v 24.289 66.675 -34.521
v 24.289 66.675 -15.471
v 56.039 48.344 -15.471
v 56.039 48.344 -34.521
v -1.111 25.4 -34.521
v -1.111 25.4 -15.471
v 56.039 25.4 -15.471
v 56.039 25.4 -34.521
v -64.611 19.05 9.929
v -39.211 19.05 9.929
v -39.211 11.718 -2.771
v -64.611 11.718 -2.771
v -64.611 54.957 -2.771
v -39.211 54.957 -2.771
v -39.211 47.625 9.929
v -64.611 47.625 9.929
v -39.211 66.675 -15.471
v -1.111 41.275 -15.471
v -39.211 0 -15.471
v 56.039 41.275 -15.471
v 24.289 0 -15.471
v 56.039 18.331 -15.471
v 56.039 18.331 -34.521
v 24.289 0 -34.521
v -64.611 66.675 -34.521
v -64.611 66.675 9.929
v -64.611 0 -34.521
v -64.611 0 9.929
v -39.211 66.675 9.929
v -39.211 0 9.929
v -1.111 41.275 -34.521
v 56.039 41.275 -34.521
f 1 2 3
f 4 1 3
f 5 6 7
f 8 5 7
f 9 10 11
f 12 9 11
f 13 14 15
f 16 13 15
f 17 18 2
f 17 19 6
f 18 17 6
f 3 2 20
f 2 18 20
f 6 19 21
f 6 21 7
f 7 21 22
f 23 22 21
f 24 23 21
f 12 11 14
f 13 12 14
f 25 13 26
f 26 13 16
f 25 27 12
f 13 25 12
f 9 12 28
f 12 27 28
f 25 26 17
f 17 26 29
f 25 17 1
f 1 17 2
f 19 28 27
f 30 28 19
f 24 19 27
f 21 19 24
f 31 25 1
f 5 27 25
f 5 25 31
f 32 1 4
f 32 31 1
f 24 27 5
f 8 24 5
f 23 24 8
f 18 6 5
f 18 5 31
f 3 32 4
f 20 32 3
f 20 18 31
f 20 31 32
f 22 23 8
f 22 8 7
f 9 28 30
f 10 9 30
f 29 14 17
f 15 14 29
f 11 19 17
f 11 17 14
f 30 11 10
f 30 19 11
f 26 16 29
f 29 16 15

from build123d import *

# Parameters (mm, degrees)
F0_W     = 120.65
F0_H     = 44.45
F1_DEPTH = 66.675
F2_W     = 95.25
F2_H     = 25.4
F3_DEPTH = 66.676
F4_W     = 57.15
F4_H     = 15.875
F5_DEPTH = 19.051
F7_DEPTH = 19.051
F9_DEPTH = 25.401


with BuildPart() as f1:
    # F0 (on Front) → F1 (new body)
    with BuildSketch(Plane.XZ):
        with Locations((-4.2862482369, -12.2960915925)):
            Rectangle(F0_W, F0_H)
    extrude(amount=-F1_DEPTH)

    # F2 (on face) → F3 (cut, through all)
    with BuildSketch(Plane.XZ):
        with Locations((8.4137517631, -2.7710915925)):
            Rectangle(F2_W, F2_H)
    extrude(amount=-F3_DEPTH, mode=Mode.SUBTRACT)

    # F4 (on face) → F5 (cut, through all)
    with BuildSketch(Plane.XY.offset(-15.4710915925)):
        with Locations((27.4637517631, 33.3375)):
            Rectangle(F4_W, F4_H)
    extrude(amount=-F5_DEPTH, mode=Mode.SUBTRACT)

    # F6 (on face) → F7 (cut, through all)
    with BuildSketch(Plane.XY.offset(-15.4710915925)):
        Polygon((56.0387517631, 66.675), (24.2887517631, 66.675), (56.0387517631, 48.3441289532), align=None)
        Polygon((56.0387517631, 0), (56.0387517631, 18.3308710468), (24.2887517631, 0), align=None)
    extrude(amount=-F7_DEPTH, mode=Mode.SUBTRACT)

    # F8 (on face) → F9 (cut, through all)
    with BuildSketch(Plane.YZ.offset(-39.2112482369)):
        Polygon((19.05, 9.9289084075), (11.7176515813, -2.7710915925), (54.9573484187, -2.7710915925), (47.625, 9.9289084075), align=None)
    extrude(amount=-F9_DEPTH, mode=Mode.SUBTRACT)


solid = f1.part
